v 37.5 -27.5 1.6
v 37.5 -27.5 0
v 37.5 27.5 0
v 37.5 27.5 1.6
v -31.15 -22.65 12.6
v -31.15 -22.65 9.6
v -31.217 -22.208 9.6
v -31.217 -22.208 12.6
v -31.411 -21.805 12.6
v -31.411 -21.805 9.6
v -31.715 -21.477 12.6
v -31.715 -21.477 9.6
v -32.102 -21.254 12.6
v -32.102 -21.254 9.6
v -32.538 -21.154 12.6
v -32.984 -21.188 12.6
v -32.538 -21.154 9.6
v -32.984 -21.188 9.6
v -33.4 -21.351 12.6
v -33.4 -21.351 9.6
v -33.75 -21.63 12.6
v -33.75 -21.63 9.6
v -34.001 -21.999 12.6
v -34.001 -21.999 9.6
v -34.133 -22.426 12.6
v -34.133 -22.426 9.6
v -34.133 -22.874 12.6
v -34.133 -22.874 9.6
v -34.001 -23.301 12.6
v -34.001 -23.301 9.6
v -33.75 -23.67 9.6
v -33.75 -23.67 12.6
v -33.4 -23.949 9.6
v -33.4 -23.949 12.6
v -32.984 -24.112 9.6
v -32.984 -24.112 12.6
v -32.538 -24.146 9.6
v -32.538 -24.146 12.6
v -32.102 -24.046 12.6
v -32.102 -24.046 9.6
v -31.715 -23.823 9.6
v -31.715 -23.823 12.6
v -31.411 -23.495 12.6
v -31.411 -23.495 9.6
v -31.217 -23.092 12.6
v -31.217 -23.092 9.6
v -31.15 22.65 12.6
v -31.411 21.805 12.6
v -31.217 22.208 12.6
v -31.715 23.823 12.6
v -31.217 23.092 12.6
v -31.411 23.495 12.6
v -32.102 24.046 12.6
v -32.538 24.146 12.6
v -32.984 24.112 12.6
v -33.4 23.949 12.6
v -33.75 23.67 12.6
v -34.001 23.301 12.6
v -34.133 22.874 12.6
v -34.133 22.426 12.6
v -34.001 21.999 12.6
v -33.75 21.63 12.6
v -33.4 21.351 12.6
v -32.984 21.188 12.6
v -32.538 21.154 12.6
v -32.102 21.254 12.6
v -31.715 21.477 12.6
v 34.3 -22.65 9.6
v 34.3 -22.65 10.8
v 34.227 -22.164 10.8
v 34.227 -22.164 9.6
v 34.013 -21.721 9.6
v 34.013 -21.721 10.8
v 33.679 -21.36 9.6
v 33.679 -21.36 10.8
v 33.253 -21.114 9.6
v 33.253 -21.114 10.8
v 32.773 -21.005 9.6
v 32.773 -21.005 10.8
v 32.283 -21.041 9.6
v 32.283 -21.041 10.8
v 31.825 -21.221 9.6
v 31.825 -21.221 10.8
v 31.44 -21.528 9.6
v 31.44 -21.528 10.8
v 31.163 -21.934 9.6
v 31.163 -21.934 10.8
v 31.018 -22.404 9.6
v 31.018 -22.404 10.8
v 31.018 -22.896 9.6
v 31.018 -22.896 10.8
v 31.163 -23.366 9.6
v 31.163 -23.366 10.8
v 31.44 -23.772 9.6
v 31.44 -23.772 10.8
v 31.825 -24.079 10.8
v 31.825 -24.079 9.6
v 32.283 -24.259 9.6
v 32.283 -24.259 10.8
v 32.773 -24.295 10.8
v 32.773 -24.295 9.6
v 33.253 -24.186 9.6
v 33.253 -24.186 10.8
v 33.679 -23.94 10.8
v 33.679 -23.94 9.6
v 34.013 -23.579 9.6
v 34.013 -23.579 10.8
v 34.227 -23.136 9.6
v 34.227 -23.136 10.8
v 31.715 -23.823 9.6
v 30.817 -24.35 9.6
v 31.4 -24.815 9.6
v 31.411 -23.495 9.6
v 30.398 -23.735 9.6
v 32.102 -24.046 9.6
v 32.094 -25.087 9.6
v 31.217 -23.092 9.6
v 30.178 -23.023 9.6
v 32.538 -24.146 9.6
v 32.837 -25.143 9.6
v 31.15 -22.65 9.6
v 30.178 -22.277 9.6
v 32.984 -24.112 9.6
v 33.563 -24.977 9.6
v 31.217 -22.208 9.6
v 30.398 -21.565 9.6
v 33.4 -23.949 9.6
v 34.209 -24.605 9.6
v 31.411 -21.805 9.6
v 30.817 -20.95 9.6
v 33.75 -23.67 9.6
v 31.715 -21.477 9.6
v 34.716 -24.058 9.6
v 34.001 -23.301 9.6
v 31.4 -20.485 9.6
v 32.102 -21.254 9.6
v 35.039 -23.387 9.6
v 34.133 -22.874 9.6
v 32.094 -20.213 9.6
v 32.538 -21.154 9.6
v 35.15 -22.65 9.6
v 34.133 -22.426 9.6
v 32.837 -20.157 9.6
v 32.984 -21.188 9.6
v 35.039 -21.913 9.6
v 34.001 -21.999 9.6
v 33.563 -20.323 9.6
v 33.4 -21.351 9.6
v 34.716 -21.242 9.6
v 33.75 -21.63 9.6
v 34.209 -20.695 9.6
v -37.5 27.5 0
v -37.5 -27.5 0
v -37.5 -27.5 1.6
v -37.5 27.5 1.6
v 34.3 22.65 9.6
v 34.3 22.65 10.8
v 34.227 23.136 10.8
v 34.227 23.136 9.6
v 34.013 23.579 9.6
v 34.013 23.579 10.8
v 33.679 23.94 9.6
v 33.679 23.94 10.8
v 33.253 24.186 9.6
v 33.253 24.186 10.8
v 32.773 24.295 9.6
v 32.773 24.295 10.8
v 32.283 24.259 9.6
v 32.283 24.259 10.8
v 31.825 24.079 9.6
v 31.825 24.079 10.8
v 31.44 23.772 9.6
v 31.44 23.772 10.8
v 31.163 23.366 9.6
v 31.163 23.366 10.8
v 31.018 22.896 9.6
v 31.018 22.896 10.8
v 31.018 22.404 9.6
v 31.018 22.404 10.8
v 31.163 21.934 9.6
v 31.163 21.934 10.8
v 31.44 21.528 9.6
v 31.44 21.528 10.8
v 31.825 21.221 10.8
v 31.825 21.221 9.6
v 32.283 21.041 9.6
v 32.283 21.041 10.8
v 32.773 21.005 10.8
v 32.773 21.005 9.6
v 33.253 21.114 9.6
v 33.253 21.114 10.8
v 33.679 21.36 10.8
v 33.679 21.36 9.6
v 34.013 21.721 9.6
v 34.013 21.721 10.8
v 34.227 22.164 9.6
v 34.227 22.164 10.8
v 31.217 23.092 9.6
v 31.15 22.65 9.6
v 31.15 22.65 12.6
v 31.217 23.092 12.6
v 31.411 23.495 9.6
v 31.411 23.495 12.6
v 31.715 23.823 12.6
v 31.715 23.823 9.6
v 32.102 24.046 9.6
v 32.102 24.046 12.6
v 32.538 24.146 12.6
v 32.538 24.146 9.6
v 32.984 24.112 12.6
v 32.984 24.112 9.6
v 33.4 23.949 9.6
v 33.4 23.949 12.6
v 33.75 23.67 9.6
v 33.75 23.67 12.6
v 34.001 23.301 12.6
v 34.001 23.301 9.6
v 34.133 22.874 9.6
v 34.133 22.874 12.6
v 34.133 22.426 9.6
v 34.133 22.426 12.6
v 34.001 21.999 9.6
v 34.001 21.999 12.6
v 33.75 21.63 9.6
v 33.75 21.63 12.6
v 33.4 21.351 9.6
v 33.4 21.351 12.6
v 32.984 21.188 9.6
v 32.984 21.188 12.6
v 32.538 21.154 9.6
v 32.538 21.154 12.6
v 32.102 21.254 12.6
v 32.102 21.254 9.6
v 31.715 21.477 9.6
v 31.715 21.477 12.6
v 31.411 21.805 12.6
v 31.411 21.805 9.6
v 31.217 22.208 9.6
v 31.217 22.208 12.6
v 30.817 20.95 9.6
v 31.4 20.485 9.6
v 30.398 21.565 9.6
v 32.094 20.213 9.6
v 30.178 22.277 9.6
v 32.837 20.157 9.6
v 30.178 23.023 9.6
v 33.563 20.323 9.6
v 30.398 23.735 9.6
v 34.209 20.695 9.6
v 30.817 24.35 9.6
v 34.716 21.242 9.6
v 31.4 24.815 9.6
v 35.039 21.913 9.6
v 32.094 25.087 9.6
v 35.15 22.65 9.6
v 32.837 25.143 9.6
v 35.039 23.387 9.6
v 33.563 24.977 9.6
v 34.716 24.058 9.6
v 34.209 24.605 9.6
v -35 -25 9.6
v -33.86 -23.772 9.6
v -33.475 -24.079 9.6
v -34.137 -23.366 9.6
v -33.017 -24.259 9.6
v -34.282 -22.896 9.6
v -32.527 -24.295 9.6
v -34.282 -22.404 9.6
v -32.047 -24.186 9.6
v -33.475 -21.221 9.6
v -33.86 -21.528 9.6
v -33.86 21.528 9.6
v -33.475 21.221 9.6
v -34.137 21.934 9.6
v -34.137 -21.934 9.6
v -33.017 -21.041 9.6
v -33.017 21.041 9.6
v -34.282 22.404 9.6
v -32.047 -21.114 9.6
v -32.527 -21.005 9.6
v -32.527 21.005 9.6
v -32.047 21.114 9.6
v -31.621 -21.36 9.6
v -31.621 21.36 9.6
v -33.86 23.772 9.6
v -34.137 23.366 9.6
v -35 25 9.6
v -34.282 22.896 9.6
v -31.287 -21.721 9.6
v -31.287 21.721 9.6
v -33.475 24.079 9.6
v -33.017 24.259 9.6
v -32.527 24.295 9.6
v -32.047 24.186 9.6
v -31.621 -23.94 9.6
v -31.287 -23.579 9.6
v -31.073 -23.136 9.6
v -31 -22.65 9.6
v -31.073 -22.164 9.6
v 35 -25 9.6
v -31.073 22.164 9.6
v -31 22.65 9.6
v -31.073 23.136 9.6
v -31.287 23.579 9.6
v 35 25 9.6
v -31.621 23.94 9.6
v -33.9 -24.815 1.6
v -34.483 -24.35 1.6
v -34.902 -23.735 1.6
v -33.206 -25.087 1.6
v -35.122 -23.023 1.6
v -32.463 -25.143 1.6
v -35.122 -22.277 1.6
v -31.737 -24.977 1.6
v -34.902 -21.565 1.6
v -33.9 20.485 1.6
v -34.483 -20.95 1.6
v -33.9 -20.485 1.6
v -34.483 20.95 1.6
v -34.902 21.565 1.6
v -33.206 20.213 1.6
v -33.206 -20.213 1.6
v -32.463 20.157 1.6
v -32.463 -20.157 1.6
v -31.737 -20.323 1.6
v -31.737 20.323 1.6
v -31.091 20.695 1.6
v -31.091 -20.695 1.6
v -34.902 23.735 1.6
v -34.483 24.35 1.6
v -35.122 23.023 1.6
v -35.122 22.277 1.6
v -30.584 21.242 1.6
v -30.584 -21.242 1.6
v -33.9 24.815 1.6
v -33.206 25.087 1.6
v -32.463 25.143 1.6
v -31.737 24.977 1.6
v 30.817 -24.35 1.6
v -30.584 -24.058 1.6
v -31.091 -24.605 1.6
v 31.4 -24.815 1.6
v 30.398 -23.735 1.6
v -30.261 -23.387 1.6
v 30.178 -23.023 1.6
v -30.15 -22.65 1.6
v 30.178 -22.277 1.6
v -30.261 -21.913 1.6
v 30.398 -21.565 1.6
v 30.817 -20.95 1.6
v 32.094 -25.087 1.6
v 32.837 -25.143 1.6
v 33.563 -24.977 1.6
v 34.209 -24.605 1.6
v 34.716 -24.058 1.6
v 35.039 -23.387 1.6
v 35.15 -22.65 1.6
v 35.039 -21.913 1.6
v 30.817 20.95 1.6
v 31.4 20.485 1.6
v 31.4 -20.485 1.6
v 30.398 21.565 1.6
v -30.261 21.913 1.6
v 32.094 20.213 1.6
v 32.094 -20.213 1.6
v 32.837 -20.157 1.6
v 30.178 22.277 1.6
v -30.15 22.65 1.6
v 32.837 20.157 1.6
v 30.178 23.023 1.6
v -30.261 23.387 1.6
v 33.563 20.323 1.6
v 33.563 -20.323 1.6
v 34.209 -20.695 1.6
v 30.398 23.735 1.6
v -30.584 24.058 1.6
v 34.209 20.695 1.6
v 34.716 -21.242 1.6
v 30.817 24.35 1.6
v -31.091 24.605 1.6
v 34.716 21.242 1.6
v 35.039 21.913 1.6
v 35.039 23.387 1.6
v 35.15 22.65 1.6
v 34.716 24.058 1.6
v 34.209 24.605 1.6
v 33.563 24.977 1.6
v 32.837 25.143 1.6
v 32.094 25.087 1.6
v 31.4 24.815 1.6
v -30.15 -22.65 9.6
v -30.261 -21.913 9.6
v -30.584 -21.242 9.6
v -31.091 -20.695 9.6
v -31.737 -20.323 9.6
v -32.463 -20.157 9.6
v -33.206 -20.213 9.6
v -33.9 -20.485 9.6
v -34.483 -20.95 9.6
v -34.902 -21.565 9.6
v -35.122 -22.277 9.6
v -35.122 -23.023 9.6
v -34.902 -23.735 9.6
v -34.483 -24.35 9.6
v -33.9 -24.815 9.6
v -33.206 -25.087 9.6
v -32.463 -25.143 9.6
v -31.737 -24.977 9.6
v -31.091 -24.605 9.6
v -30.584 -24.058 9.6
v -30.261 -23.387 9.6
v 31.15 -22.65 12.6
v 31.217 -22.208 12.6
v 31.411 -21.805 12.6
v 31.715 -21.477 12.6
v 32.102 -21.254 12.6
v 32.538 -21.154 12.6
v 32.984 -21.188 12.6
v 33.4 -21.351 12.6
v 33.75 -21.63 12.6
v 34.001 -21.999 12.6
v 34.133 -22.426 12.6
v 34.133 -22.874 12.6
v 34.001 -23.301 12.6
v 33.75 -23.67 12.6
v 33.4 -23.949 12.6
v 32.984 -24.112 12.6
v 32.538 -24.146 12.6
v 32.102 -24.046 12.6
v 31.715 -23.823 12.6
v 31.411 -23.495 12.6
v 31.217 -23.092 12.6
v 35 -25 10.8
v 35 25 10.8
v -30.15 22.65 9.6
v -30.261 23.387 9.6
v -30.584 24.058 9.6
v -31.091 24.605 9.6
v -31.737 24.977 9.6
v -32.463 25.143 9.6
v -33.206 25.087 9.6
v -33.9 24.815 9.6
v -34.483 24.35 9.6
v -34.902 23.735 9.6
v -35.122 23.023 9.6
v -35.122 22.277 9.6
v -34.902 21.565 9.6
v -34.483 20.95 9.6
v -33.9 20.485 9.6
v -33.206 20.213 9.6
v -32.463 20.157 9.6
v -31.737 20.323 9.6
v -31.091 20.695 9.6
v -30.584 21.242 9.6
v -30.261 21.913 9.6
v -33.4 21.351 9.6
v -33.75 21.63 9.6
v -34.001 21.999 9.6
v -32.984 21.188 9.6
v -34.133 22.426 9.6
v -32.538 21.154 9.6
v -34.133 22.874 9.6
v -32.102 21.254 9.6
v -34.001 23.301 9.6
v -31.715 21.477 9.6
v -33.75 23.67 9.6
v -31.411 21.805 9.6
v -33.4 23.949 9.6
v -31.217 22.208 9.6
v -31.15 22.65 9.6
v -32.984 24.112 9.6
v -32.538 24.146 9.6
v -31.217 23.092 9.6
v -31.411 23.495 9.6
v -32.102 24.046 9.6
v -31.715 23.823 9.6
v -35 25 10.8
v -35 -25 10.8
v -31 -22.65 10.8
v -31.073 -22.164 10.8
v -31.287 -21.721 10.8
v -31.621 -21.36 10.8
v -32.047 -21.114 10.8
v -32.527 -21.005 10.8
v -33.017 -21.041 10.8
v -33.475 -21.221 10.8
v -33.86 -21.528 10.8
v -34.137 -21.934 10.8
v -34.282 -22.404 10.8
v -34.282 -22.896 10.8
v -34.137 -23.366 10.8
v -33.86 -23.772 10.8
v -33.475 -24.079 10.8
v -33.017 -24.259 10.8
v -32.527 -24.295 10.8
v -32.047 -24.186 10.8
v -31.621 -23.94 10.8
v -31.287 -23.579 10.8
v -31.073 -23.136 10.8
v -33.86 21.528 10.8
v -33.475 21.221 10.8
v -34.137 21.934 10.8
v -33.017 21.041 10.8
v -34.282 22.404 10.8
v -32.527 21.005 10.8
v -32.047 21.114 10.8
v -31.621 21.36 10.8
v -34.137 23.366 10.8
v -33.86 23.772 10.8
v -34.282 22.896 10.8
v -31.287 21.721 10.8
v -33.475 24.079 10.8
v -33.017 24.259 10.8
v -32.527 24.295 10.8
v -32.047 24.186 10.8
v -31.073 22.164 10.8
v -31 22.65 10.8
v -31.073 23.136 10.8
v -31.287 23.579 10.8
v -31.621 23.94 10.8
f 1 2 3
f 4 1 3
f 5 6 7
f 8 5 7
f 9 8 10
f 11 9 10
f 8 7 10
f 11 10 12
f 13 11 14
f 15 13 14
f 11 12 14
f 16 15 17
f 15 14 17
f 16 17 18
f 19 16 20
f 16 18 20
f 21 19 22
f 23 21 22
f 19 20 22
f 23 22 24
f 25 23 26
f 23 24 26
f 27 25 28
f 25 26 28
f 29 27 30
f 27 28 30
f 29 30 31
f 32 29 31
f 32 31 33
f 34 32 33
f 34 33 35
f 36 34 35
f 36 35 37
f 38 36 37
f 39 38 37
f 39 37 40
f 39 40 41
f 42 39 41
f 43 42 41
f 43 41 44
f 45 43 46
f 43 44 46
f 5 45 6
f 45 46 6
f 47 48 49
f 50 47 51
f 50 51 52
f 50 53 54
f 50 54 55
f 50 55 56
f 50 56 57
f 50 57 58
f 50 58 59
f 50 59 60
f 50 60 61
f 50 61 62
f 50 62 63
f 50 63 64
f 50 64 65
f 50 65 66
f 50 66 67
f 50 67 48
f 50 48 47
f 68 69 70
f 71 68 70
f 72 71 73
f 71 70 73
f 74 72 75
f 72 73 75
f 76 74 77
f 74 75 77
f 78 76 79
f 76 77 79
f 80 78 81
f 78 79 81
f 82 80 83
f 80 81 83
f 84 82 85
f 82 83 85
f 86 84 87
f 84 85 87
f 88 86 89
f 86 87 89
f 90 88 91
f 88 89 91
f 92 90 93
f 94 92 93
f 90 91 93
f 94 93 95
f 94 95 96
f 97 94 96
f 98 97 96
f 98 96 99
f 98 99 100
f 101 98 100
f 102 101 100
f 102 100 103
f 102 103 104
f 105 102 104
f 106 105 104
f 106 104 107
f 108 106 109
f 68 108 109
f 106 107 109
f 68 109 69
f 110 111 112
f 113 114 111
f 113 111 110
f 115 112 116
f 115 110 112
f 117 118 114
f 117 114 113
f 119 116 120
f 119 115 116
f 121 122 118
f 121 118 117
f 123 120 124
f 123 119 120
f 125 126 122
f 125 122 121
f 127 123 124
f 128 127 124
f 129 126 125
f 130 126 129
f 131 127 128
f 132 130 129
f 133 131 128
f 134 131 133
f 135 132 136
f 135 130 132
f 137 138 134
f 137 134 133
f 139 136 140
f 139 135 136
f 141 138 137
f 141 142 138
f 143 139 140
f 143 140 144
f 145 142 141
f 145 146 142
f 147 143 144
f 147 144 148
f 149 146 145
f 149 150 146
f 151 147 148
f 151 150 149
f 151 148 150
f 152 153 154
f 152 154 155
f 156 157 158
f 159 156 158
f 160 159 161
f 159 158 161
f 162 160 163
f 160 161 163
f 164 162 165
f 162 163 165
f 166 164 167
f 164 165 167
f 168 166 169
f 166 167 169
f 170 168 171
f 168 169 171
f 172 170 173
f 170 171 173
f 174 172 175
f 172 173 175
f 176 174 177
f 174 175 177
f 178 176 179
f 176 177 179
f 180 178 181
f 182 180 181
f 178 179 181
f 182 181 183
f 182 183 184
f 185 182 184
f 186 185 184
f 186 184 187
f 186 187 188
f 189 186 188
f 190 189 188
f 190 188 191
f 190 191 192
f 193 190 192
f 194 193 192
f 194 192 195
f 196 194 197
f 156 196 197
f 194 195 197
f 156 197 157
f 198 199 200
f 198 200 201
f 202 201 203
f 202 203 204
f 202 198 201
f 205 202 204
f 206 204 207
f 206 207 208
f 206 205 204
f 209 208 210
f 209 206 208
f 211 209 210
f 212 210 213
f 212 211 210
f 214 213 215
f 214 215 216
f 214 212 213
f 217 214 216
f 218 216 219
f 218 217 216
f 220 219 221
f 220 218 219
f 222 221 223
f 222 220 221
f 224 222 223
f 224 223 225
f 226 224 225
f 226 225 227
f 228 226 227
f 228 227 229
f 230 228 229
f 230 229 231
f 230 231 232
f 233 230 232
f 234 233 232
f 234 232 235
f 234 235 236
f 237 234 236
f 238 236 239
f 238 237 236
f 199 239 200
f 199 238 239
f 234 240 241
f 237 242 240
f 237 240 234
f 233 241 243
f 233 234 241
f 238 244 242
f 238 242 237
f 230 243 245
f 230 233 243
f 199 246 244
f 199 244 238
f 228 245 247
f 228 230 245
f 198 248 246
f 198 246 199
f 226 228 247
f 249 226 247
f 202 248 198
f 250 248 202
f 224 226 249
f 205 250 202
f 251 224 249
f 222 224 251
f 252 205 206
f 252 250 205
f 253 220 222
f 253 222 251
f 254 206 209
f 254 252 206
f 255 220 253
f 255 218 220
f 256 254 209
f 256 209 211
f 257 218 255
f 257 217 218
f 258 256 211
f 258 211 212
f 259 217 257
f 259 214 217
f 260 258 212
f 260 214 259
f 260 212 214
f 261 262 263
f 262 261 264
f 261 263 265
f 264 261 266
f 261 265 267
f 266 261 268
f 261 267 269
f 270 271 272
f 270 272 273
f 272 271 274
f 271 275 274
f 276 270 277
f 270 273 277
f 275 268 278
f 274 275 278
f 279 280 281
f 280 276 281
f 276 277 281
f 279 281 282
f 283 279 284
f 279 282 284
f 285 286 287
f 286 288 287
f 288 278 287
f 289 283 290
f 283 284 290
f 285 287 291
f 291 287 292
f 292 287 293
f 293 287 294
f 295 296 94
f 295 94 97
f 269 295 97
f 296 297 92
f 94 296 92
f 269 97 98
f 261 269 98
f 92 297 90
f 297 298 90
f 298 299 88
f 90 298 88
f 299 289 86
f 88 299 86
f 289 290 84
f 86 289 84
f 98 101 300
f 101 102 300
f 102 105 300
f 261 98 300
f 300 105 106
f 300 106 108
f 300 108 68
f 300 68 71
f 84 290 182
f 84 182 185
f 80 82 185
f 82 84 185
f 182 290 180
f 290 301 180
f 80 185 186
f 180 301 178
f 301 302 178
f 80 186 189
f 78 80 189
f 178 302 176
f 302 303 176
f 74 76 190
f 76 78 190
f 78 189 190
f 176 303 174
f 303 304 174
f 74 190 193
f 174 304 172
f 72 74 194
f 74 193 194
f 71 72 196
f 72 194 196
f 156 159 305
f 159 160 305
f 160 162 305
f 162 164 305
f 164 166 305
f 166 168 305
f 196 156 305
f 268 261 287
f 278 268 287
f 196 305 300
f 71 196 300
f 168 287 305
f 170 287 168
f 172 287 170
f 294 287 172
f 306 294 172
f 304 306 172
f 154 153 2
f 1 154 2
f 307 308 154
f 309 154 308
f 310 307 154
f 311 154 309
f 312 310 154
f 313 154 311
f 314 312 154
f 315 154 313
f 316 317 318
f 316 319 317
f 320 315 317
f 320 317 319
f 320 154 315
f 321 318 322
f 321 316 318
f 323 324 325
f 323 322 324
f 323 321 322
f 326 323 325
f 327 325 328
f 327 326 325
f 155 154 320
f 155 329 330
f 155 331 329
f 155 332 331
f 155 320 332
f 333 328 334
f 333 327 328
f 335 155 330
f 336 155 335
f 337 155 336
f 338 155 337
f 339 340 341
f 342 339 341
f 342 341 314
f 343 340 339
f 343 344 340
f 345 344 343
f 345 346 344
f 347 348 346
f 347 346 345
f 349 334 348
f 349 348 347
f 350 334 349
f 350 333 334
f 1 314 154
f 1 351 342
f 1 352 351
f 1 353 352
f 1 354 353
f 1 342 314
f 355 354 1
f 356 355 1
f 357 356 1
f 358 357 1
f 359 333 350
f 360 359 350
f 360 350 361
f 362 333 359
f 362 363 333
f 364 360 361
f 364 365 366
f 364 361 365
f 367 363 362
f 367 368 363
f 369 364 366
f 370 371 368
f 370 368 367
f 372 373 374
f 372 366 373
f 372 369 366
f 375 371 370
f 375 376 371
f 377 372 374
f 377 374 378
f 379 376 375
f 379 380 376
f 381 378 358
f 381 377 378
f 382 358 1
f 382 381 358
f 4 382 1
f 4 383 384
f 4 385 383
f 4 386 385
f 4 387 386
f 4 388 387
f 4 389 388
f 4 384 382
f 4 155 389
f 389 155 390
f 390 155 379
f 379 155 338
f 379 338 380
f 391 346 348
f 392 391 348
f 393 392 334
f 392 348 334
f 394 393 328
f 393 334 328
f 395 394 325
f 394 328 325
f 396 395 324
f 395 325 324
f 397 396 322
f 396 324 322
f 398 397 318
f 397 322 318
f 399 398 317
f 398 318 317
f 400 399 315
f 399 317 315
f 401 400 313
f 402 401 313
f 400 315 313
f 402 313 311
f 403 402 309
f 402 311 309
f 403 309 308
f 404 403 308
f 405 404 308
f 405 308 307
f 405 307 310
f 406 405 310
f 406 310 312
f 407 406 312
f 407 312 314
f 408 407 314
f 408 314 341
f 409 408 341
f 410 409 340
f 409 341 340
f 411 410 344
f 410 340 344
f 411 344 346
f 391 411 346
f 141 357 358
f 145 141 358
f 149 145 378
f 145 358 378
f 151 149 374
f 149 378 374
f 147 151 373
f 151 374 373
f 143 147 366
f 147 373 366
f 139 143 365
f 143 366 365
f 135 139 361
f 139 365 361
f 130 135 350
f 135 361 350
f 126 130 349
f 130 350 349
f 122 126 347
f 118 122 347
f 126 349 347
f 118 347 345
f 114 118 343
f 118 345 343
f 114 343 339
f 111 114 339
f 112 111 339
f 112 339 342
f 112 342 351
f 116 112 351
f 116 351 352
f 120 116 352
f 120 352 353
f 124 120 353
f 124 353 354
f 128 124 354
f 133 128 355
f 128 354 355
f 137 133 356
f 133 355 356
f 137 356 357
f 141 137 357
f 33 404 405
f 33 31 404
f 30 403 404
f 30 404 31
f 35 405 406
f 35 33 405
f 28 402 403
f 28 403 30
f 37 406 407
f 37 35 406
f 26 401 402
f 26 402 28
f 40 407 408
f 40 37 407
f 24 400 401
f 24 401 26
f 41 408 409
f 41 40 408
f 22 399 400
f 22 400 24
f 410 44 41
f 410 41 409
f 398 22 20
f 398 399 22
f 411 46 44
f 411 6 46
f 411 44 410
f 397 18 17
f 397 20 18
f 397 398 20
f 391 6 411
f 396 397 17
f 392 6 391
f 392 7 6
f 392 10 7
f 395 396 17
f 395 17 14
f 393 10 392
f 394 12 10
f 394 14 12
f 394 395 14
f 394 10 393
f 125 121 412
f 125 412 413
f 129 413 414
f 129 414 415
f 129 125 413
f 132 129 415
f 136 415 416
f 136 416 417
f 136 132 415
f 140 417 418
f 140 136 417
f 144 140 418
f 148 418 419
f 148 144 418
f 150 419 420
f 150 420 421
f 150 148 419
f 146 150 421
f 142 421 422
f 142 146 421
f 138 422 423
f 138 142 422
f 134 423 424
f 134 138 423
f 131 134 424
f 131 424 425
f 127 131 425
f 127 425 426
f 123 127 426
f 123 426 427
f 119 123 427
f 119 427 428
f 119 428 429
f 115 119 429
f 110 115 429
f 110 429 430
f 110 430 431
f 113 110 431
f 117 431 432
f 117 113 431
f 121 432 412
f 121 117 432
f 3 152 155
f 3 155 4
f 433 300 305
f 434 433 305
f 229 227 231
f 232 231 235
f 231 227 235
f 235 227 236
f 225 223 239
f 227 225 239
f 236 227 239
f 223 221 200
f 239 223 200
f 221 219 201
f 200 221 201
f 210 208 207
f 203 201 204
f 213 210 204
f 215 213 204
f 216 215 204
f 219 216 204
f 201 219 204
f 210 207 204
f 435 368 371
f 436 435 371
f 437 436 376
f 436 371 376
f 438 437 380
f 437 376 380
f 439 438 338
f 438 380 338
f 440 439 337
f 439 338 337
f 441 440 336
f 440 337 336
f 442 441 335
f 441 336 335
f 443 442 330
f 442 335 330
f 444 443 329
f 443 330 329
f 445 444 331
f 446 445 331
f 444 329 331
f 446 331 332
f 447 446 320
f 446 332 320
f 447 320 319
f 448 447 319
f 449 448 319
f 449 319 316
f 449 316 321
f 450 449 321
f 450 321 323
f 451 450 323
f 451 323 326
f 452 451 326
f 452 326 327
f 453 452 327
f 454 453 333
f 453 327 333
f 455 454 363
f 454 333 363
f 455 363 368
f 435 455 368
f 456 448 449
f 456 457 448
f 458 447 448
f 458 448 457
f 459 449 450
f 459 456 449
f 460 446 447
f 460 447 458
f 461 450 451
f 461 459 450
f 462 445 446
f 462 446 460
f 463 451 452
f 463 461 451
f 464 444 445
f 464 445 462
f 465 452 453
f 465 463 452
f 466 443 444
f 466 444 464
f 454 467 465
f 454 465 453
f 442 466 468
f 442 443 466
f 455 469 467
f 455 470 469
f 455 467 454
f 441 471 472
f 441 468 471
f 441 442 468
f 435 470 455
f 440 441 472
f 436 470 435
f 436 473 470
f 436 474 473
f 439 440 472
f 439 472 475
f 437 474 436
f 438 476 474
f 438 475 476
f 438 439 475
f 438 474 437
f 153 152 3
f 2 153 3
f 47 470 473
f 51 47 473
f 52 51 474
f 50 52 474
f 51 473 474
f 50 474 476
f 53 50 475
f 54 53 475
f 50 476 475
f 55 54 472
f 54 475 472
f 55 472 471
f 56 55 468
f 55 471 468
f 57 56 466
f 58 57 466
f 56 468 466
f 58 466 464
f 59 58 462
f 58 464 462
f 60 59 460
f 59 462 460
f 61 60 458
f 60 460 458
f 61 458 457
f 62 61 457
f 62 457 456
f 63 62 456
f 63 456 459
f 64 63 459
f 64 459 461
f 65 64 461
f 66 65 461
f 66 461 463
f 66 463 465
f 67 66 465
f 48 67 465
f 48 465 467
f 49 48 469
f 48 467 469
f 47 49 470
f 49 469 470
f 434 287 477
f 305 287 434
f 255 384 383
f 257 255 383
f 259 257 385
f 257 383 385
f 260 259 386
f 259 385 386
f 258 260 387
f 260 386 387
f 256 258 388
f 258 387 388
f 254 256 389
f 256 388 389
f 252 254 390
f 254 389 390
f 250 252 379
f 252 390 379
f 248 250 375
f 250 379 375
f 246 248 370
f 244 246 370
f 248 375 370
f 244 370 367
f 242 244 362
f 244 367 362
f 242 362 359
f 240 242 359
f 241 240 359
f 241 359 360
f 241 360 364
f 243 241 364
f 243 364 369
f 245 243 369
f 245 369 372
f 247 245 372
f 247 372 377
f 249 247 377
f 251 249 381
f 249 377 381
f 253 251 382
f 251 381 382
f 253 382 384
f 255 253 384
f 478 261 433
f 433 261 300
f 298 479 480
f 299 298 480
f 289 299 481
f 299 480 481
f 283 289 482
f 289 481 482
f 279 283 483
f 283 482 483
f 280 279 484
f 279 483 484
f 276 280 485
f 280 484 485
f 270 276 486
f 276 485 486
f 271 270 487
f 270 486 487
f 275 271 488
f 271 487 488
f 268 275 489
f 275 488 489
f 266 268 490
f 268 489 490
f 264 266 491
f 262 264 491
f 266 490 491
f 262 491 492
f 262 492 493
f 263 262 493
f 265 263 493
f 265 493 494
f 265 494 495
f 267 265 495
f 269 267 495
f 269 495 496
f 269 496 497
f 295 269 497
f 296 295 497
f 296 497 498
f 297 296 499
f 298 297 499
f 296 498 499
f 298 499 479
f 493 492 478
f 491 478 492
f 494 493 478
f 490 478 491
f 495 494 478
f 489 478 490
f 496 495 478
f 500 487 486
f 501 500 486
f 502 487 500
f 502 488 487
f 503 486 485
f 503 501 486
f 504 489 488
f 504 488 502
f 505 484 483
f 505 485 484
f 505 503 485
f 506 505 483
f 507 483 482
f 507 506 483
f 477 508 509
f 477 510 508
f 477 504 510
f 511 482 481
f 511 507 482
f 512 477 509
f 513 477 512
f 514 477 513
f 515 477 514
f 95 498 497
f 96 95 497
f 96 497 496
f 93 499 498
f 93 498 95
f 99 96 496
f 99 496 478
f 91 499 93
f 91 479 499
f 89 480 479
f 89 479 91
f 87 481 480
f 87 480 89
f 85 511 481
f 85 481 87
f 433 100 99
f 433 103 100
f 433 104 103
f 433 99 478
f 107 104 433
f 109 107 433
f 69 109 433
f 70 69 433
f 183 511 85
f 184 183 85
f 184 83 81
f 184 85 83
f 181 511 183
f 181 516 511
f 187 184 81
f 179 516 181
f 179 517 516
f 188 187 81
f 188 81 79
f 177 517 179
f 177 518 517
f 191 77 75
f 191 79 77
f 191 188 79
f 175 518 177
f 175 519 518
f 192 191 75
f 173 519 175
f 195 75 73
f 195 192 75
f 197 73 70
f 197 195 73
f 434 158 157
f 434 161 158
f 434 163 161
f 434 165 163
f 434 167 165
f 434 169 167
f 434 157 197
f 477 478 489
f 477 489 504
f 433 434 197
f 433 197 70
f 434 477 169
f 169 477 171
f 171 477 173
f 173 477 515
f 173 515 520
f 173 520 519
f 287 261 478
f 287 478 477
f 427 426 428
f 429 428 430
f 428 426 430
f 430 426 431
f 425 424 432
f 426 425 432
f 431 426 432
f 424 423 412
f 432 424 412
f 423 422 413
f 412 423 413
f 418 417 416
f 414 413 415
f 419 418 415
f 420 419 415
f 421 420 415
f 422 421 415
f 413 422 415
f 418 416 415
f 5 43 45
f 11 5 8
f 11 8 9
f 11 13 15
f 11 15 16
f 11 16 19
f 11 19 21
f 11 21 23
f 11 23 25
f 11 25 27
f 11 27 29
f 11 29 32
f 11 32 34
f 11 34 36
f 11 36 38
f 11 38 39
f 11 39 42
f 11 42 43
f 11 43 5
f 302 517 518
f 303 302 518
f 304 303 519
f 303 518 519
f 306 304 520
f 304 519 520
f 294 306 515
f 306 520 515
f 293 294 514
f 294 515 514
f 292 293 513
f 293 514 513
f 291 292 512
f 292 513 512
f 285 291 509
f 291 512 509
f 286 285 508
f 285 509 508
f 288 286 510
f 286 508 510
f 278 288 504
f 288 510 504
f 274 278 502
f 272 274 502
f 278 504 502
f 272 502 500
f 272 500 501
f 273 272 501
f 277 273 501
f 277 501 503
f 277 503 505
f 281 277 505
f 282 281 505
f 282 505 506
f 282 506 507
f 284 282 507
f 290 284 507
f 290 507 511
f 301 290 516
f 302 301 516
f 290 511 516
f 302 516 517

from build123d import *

# Parameters (mm, degrees)
SKETCH_W     = 70
SKETCH_H     = 50
PAD_DEPTH    = 1.2
SKETCH001_R  = 1.65
POCKET_DEPTH = 1.2
SKETCH002_W  = 75
SKETCH002_H  = 55
PAD001_DEPTH = 1.6
SKETCH003_R  = 2.5
PAD002_DEPTH = 8
SKETCH004_R  = 1.5
PAD003_DEPTH = 3


with BuildPart() as pcb:
    # Sketch → Pad (new body)
    with BuildSketch(Plane.XY):
        Rectangle(SKETCH_W, SKETCH_H)
    extrude(amount=PAD_DEPTH)

    # Sketch001 (on Face6 of Pad) → Pocket (cut)
    with BuildSketch(Plane.XY.offset(1.2)):
        with Locations((-32.65, 22.65)):
            Circle(SKETCH001_R)
        with Locations((32.65, 22.65)):
            Circle(SKETCH001_R)
        with Locations((-32.65, -22.65)):
            Circle(SKETCH001_R)
        with Locations((32.65, -22.65)):
            Circle(SKETCH001_R)
    extrude(amount=-POCKET_DEPTH, mode=Mode.SUBTRACT)


with BuildPart() as pcb_1:
    # Body placement: moved
    add(pcb.part.moved(Location((0, 0, 9.6))))


with BuildPart() as case_bottom:
    # Sketch002 → Pad001 (new body)
    with BuildSketch(Plane.XY):
        Rectangle(SKETCH002_W, SKETCH002_H)
    extrude(amount=PAD001_DEPTH)

    # Sketch003 (on Face6 of Pad001) → Pad002 (join)
    with BuildSketch(Plane.XY.offset(1.6)):
        with Locations((-32.65, 22.65)):
            Circle(SKETCH003_R)
        with Locations((-32.65, -22.65)):
            Circle(SKETCH003_R)
        with Locations((32.65, 22.65)):
            Circle(SKETCH003_R)
        with Locations((32.65, -22.65)):
            Circle(SKETCH003_R)
    extrude(amount=PAD002_DEPTH)

    # Sketch004 (on Face14 of Pad002) → Pad003 (join)
    with BuildSketch(Plane.XY.offset(9.6)):
        with Locations((-32.65, -22.65)):
            Circle(SKETCH004_R)
        with Locations((-32.65, 22.65)):
            Circle(SKETCH004_R)
    pad003 = extrude(amount=PAD003_DEPTH)

    # Mirrored: Pad003 across Sketch004 V_Axis
    add(pad003.mirror(Plane(origin=(0, 0, 9.6), x_dir=(0, 0, 1), z_dir=(1, 0, 0))))


solid = Compound([pcb_1.part, case_bottom.part])
